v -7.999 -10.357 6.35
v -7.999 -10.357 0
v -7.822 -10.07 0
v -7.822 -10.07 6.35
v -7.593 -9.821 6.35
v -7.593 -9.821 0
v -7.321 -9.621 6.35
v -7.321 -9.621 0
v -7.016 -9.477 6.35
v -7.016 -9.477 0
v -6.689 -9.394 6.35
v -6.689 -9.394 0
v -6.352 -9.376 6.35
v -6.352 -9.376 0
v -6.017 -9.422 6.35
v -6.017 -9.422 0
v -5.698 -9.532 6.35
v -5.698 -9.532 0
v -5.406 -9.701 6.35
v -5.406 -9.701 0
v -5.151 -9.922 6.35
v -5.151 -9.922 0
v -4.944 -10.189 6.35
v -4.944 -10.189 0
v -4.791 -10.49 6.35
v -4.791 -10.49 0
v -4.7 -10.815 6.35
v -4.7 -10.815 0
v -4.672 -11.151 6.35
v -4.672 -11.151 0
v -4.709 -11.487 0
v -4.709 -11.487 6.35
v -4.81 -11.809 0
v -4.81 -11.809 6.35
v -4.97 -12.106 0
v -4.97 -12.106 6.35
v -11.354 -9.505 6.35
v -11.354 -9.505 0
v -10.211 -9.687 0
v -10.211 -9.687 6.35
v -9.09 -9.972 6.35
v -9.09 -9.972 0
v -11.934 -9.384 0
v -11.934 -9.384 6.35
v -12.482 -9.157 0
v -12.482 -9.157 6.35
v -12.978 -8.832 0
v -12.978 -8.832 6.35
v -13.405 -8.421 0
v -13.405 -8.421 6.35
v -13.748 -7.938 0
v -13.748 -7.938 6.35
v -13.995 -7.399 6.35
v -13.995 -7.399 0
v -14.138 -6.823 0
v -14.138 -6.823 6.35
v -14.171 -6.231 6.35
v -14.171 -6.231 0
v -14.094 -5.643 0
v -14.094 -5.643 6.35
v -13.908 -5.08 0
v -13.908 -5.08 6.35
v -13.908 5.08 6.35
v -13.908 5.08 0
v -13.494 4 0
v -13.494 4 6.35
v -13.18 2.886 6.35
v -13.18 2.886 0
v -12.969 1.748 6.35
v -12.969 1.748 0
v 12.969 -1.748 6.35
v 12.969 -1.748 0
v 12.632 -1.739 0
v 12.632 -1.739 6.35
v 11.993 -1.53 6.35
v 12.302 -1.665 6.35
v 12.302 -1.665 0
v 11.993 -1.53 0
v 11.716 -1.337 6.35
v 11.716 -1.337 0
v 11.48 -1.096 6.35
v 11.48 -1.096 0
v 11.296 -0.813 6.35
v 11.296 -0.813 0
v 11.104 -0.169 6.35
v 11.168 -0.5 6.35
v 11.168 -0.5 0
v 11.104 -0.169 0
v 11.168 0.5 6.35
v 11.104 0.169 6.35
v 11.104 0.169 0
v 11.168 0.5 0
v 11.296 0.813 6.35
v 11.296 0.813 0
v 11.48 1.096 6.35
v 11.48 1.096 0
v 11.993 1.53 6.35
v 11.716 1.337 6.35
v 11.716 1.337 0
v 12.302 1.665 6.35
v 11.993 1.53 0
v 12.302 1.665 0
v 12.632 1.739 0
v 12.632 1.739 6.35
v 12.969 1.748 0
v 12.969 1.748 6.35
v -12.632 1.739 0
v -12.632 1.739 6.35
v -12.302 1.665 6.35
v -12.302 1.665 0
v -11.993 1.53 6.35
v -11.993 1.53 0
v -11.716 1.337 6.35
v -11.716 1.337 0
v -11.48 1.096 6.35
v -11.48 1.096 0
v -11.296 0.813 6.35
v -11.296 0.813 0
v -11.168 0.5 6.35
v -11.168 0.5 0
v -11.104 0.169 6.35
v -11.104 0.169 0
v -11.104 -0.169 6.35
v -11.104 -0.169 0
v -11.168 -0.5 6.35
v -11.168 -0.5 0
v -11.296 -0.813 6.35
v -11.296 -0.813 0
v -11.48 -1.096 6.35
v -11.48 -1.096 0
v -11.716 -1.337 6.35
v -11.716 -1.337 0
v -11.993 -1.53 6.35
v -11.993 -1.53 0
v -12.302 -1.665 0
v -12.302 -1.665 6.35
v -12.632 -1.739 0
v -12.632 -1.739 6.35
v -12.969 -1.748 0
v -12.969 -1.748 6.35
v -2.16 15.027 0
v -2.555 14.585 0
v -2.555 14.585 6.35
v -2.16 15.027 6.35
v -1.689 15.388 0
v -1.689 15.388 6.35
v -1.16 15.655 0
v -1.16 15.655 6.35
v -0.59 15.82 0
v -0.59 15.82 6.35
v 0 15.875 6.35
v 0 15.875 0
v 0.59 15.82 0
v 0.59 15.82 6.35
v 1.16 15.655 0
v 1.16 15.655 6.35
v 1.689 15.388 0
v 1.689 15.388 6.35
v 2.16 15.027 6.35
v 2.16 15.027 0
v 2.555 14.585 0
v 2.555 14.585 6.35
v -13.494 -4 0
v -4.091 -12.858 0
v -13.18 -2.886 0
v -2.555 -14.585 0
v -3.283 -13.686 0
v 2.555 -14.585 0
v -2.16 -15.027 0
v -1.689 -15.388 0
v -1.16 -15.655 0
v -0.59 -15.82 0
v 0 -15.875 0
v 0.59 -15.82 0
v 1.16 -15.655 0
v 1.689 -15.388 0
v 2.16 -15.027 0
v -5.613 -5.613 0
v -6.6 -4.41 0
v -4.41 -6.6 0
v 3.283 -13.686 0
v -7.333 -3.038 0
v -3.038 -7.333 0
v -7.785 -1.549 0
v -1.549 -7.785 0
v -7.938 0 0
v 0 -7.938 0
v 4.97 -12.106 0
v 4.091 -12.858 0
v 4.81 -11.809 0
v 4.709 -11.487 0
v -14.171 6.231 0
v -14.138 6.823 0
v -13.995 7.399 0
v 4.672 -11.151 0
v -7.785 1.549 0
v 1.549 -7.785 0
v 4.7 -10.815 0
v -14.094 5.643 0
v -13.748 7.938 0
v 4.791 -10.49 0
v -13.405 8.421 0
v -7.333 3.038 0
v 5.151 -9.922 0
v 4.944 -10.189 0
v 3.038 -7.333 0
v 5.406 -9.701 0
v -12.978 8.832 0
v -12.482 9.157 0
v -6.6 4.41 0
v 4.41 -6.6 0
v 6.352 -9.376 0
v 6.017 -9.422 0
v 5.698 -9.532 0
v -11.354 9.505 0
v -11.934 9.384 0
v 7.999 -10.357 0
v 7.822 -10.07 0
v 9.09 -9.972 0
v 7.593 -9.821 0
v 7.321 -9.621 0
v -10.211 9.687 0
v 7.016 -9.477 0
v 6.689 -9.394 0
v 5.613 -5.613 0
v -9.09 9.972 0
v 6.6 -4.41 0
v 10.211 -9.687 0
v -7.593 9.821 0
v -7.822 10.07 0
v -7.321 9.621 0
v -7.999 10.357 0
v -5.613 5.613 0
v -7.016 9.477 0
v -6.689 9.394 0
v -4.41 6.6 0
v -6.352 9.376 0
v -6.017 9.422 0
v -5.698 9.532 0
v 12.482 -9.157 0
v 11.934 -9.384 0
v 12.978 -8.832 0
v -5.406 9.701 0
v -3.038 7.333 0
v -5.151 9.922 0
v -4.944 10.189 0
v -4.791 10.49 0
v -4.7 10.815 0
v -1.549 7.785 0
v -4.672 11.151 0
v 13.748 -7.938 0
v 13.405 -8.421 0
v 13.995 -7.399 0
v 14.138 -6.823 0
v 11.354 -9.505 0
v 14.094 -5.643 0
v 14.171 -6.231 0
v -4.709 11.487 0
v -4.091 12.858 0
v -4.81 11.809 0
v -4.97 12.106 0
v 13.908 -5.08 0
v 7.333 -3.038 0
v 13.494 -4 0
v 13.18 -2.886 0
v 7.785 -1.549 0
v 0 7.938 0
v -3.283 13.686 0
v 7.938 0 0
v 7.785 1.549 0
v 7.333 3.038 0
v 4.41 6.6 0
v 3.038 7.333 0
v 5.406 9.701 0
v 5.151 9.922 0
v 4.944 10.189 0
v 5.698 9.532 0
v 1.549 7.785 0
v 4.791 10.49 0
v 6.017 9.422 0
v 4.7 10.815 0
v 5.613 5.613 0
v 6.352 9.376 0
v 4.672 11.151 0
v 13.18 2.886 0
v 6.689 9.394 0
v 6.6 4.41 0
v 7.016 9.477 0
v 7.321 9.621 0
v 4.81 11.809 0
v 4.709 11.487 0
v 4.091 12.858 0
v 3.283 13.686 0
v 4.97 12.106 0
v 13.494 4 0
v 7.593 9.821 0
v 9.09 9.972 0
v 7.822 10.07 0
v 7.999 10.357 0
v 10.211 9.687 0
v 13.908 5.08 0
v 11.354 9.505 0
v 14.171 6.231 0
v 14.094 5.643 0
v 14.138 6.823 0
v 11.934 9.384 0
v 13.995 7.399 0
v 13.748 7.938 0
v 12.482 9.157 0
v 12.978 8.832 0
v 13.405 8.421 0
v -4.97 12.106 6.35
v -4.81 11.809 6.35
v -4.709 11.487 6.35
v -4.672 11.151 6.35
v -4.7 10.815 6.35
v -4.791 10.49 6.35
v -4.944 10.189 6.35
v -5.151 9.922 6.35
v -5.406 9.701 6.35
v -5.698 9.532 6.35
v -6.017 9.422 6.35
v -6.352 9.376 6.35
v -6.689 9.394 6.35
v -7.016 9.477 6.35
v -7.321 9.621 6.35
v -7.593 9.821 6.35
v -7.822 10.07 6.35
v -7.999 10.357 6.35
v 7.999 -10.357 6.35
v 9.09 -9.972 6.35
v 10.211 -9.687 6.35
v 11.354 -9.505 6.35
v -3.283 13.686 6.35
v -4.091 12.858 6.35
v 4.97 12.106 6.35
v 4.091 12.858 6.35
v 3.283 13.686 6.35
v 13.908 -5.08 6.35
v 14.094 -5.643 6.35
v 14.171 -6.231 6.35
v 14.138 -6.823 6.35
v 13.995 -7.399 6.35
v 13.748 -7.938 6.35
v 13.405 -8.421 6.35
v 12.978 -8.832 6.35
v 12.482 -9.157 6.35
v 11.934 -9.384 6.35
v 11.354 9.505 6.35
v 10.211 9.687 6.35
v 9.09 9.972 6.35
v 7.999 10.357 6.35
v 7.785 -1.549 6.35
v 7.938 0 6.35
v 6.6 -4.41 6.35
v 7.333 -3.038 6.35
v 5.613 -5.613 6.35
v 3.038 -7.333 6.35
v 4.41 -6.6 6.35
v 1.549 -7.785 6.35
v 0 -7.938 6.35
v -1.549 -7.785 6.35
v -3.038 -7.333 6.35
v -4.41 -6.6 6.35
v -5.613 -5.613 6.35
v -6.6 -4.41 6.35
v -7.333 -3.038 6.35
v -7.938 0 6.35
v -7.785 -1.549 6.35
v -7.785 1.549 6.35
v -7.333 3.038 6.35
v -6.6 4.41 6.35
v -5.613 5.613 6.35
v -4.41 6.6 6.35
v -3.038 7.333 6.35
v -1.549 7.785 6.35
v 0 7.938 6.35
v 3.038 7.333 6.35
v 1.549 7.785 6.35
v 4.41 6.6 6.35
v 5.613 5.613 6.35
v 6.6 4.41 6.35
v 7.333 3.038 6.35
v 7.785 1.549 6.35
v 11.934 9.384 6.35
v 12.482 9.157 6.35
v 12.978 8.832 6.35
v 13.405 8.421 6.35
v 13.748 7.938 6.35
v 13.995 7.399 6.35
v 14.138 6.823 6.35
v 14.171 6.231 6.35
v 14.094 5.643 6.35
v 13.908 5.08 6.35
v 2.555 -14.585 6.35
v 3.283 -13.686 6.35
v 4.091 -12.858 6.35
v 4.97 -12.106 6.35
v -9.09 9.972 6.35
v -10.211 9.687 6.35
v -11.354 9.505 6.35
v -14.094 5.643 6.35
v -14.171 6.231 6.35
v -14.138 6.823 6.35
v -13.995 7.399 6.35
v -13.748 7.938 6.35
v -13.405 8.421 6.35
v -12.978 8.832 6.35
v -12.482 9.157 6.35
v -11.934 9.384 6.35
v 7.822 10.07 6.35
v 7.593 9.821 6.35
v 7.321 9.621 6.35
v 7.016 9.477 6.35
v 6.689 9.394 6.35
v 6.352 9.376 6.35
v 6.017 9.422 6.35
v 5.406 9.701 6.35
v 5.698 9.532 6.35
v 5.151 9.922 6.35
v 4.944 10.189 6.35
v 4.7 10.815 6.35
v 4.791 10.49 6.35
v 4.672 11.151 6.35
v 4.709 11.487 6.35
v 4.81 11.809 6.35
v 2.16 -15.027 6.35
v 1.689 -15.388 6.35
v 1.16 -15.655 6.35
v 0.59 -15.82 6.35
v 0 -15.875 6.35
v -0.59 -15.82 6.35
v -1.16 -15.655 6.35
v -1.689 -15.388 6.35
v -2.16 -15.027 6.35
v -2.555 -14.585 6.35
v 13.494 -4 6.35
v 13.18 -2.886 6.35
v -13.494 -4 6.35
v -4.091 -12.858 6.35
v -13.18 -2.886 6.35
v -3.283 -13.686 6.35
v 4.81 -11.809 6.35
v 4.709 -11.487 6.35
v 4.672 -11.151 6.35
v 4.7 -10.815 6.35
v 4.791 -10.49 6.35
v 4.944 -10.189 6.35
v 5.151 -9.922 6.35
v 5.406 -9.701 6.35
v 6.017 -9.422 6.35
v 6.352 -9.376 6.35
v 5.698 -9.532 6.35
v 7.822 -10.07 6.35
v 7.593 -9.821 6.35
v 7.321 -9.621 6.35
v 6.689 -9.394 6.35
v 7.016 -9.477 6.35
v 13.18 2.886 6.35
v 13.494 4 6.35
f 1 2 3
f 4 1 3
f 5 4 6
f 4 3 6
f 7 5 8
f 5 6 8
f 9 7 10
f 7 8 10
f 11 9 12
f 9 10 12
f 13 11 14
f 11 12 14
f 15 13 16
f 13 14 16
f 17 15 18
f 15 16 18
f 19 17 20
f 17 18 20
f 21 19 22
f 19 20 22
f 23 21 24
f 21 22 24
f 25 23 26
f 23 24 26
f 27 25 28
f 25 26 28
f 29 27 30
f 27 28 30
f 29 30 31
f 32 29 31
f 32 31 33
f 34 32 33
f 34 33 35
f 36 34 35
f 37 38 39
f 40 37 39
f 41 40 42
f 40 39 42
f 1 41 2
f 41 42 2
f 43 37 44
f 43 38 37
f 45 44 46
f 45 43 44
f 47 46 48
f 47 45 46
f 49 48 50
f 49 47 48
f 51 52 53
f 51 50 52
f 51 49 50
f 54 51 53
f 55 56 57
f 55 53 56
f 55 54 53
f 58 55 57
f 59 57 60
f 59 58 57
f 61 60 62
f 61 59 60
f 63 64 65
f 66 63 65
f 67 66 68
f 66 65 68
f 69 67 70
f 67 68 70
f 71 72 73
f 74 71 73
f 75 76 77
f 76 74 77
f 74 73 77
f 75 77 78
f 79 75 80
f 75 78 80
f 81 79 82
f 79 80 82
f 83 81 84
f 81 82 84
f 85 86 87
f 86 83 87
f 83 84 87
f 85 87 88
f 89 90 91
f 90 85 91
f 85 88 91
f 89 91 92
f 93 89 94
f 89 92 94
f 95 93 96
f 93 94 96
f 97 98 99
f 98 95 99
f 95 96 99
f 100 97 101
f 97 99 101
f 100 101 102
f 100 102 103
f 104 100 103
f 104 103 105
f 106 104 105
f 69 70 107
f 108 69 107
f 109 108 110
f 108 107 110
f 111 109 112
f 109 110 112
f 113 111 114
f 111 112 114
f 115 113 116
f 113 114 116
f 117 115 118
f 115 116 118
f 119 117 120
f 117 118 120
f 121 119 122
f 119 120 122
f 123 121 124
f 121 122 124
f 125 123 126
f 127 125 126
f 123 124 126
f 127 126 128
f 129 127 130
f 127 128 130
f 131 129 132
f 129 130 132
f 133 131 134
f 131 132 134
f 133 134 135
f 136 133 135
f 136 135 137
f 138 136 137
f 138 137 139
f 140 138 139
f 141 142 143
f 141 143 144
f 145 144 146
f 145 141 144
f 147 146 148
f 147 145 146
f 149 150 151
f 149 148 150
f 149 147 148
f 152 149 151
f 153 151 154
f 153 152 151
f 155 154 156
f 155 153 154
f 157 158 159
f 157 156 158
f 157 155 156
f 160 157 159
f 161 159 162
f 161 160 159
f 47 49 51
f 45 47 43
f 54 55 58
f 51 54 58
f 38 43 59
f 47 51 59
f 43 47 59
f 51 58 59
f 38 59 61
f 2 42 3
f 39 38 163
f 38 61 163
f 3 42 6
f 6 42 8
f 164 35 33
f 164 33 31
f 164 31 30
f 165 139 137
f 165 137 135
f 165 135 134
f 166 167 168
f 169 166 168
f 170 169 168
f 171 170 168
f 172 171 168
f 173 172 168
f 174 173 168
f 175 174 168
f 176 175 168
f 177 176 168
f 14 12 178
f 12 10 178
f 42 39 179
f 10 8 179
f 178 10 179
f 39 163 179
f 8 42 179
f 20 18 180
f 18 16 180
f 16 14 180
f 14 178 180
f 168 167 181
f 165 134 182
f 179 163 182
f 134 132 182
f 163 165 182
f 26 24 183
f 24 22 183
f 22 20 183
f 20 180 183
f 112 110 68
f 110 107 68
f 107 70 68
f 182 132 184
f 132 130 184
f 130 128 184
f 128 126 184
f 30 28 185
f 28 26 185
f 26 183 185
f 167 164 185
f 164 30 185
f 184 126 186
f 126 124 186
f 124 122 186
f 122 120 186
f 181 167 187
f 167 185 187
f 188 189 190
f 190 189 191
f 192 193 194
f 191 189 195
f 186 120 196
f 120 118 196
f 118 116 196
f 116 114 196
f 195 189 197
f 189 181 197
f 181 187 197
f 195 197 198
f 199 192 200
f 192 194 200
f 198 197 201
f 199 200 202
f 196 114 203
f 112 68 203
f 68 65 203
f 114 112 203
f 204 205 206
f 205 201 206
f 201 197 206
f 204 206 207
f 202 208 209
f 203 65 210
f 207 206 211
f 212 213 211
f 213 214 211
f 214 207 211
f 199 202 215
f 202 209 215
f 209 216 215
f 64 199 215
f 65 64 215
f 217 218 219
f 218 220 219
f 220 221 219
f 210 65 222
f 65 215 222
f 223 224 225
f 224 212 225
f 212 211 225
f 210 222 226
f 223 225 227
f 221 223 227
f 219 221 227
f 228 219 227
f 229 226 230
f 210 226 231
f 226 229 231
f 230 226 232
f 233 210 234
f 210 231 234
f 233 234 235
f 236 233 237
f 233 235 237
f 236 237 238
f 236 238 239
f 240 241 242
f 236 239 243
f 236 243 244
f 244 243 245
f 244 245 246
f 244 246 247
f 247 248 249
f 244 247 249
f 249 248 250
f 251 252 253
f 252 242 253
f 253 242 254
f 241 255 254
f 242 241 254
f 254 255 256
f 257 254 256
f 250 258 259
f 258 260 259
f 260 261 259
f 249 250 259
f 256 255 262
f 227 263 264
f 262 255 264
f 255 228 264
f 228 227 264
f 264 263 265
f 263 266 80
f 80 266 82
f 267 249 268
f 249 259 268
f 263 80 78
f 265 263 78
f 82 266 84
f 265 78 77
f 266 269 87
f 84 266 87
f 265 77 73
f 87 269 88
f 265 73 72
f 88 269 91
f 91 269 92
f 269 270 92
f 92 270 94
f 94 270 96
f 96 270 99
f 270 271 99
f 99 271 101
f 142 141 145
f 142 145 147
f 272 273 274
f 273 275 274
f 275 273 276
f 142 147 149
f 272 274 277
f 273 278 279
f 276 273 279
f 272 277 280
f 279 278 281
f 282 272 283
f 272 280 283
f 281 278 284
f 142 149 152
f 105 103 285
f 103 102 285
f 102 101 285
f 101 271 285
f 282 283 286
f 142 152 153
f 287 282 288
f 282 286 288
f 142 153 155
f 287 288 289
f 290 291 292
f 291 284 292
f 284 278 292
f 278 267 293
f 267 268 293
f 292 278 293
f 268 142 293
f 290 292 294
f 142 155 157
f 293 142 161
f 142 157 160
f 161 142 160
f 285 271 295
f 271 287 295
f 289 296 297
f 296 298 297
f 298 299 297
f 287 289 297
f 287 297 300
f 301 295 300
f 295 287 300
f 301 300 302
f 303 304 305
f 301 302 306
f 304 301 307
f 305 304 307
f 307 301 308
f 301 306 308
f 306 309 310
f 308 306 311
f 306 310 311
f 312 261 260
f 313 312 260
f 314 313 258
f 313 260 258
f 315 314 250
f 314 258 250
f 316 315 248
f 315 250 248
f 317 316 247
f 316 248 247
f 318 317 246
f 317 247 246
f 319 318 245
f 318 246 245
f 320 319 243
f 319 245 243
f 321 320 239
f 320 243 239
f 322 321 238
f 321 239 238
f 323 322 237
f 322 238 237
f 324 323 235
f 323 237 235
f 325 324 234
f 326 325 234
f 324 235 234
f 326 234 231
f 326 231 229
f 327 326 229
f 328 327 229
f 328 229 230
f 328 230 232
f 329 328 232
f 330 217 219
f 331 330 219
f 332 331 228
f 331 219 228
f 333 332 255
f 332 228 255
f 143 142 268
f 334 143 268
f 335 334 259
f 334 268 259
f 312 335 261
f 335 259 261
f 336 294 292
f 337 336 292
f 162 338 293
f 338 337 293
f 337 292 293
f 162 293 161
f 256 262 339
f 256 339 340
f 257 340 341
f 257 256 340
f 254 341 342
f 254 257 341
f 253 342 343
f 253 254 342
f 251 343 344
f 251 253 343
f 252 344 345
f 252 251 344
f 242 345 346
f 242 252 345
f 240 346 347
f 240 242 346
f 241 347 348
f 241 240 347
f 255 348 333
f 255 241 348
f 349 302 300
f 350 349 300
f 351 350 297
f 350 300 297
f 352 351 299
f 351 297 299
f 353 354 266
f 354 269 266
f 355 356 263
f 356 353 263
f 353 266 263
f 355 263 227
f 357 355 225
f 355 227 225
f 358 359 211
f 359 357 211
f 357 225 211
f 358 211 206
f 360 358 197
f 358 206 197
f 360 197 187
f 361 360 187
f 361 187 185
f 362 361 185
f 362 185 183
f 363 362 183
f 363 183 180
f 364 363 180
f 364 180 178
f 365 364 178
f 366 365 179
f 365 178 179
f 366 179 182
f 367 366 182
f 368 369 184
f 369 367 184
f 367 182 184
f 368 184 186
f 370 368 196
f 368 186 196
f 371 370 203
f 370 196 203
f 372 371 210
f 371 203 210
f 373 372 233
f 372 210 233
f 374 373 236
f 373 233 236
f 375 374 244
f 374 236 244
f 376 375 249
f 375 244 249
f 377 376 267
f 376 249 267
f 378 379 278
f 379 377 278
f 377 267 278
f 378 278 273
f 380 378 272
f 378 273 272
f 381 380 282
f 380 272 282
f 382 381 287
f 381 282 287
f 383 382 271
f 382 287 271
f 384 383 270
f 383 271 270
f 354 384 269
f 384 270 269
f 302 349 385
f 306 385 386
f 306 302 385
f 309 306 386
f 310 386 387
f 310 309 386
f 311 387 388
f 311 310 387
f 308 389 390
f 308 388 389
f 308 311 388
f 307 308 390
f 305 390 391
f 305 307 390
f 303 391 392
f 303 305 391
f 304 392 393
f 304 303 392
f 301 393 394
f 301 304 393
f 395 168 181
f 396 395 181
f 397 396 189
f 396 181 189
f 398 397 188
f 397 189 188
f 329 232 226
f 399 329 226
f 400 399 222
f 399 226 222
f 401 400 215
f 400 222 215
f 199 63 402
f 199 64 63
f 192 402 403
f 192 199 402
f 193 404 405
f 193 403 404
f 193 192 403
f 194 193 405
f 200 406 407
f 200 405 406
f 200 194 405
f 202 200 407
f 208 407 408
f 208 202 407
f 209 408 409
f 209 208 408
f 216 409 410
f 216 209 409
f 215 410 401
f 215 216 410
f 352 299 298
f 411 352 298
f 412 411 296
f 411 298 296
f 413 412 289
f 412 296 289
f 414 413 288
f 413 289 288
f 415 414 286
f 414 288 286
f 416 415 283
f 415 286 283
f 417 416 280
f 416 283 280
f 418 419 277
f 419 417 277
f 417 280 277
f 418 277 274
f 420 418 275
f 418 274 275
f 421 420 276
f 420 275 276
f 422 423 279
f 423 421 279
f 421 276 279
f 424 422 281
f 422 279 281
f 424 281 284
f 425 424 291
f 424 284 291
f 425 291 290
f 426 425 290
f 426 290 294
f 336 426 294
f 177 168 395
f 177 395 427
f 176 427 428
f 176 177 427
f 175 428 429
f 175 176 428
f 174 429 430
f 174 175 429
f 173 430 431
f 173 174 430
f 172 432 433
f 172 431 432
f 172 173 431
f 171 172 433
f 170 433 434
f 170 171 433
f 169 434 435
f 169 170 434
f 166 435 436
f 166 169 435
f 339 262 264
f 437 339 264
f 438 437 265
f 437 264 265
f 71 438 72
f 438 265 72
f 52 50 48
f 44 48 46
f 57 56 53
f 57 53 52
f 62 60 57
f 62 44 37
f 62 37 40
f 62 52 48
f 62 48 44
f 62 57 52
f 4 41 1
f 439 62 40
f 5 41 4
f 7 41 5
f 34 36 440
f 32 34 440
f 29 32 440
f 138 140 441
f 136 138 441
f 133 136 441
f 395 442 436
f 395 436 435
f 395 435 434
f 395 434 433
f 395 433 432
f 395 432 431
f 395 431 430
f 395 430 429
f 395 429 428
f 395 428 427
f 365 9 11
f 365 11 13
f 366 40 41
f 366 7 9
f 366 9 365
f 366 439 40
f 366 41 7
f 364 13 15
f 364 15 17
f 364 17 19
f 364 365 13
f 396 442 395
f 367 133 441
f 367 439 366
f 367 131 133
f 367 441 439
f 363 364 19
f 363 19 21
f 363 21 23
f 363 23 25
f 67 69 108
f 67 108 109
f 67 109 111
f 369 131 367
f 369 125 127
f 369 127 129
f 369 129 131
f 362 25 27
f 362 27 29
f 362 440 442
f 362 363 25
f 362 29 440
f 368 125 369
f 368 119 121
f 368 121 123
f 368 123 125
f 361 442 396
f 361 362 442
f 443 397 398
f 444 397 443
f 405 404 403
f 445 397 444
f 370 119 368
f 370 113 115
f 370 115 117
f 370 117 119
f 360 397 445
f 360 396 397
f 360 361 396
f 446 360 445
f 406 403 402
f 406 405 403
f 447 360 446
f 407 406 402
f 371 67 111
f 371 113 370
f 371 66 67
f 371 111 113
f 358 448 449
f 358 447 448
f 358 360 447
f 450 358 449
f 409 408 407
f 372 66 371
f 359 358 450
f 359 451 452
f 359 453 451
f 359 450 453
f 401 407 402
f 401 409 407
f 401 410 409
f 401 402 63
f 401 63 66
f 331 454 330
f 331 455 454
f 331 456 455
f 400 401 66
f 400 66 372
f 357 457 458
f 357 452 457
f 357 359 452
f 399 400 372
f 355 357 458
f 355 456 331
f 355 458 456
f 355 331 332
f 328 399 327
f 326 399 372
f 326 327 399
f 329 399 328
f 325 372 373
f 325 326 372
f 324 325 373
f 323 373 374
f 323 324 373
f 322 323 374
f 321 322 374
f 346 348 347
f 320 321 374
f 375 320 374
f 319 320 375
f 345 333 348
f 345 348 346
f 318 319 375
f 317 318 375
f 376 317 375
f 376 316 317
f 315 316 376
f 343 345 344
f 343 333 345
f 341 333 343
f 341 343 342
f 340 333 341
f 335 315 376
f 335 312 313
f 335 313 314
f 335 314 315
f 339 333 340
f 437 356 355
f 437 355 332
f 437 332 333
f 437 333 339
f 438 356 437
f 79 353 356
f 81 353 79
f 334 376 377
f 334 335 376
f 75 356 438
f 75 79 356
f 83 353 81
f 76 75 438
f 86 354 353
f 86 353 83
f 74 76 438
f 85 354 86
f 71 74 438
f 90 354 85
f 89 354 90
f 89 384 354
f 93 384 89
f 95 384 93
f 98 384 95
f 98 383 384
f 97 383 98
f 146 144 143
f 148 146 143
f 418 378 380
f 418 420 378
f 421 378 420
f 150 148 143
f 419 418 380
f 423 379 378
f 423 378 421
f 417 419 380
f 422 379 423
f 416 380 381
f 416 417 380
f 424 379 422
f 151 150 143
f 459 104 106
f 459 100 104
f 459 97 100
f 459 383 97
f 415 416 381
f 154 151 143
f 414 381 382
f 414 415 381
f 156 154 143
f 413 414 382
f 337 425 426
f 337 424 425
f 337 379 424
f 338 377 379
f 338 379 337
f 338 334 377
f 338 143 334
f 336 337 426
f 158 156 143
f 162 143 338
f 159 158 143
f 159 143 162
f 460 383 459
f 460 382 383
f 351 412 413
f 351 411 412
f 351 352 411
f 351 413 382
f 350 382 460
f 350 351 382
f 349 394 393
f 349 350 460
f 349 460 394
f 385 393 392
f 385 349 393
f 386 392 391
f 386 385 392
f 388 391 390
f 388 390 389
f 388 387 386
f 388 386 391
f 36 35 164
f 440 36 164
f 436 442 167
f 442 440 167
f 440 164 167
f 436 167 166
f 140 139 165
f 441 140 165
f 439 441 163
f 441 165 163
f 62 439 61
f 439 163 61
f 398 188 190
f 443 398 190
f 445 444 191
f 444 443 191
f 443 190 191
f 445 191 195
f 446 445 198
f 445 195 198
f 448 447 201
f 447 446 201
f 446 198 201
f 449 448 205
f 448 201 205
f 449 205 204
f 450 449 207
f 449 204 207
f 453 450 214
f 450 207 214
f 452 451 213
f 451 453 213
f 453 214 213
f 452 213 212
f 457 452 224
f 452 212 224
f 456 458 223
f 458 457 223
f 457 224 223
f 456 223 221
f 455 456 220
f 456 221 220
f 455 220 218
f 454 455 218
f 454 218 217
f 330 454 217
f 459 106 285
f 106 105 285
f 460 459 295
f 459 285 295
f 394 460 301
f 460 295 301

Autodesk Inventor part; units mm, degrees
ref_plane "YZ Plane" through (0, 0, 0) normal (1, 0, 0) x (0, 1, 0)
ref_plane "XZ Plane" through (0, 0, 0) normal (0, 1, 0) x (-1, 0, 0)
ref_plane "XY Plane" through (0, 0, 0) normal (0, 0, 1) x (1, 0, 0)
sketch "Sketch1" plane through (0, 0, 0) normal (0, 0, 1) x (1, 0, 0)
  circle A0 centre (0, 0) radius 7.9375
  circle A1 centre (0, 0) radius 15.875 construction
  line L0 (0, 0) -> (0, 15.875) construction
  circle A2 centre (0, 12.7) radius 3.175
  circle A3 centre (-10.9985, 6.35) radius 3.175
  circle A4 centre (-10.9985, -6.35) radius 3.175
  circle A5 centre (0, -12.7) radius 3.175
  circle A6 centre (10.9985, -6.35) radius 3.175
  circle A7 centre (10.9985, 6.35) radius 3.175
  arc A8 (-11.3536, 9.5051) -> (-2.5548, 14.5851) centre (-12.7741, 22.1254) ccw
  circle A9 centre (-6.4241, 11.1269) radius 1.7526
  circle A10 centre (-12.8482, 0) radius 1.7526
  arc A11 (-13.9085, -5.08) -> (-13.9085, 5.08) centre (-25.5482, 0) ccw
  circle A12 centre (-6.4241, -11.1269) radius 1.7526
  arc A13 (-2.5548, -14.5851) -> (-11.3536, -9.5051) centre (-12.7741, -22.1254) ccw
  circle A14 centre (6.4241, -11.1269) radius 1.7526
  arc A15 (11.3536, -9.5051) -> (2.5548, -14.5851) centre (12.7741, -22.1254) ccw
  circle A16 centre (12.8482, 0) radius 1.7526
  arc A17 (13.9085, 5.08) -> (13.9085, -5.08) centre (25.5482, 0) ccw
  circle A18 centre (6.4241, 11.1269) radius 1.7526
  arc A19 (2.5548, 14.5851) -> (11.3536, 9.5051) centre (12.7741, 22.1254) ccw
  point P0 (-13.9085, 5.08)
  point P1 (-12.9691, 1.7484)
  point P2 (-12.9691, -1.7484)
  point P3 (-13.9085, -5.08)
  point P4 (-11.3536, -9.5051)
  point P5 (-7.9987, -10.3574)
  point P6 (-4.9704, -12.1058)
  point P7 (-2.5548, -14.5851)
  point P8 (2.5548, -14.5851)
  point P9 (4.9704, -12.1058)
  point P10 (7.9987, -10.3574)
  point P11 (11.3536, -9.5051)
  point P12 (13.9085, -5.08)
  point P13 (12.9691, -1.7484)
  point P14 (12.9691, 1.7484)
  point P15 (13.9085, 5.08)
  point P16 (11.3536, 9.5051)
  point P17 (7.9987, 10.3574)
  point P18 (4.9704, 12.1058)
  point P19 (2.5548, 14.5851)
  point P20 (-4.9704, 12.1058)
  point P21 (-7.9987, 10.3574)
  dimension "d1" = 31.75
  dimension "d2" = 6.35
  dimension "d0" = 15.875
  dimension "d5" = 360
  dimension "d7" = 12.7
  dimension "d8" = 3.5052
  dimension "d11" = 360
extrude "Extrusion1" add sketch "Sketch1" along normal blind 6.35 contours A2 | A2 A19 A18 A7 A17 A16 A6 A15 A14 A5 A13 A12 A4 A11 A10 A3 A8 A9 | A7 | A3 | A6 | A4 | A5
equation "\"d1\" = Brass_ID"
equation "\"Brass_ID\" = 31.75"
properties part number "Gyro Core" material "UHMW, White"
